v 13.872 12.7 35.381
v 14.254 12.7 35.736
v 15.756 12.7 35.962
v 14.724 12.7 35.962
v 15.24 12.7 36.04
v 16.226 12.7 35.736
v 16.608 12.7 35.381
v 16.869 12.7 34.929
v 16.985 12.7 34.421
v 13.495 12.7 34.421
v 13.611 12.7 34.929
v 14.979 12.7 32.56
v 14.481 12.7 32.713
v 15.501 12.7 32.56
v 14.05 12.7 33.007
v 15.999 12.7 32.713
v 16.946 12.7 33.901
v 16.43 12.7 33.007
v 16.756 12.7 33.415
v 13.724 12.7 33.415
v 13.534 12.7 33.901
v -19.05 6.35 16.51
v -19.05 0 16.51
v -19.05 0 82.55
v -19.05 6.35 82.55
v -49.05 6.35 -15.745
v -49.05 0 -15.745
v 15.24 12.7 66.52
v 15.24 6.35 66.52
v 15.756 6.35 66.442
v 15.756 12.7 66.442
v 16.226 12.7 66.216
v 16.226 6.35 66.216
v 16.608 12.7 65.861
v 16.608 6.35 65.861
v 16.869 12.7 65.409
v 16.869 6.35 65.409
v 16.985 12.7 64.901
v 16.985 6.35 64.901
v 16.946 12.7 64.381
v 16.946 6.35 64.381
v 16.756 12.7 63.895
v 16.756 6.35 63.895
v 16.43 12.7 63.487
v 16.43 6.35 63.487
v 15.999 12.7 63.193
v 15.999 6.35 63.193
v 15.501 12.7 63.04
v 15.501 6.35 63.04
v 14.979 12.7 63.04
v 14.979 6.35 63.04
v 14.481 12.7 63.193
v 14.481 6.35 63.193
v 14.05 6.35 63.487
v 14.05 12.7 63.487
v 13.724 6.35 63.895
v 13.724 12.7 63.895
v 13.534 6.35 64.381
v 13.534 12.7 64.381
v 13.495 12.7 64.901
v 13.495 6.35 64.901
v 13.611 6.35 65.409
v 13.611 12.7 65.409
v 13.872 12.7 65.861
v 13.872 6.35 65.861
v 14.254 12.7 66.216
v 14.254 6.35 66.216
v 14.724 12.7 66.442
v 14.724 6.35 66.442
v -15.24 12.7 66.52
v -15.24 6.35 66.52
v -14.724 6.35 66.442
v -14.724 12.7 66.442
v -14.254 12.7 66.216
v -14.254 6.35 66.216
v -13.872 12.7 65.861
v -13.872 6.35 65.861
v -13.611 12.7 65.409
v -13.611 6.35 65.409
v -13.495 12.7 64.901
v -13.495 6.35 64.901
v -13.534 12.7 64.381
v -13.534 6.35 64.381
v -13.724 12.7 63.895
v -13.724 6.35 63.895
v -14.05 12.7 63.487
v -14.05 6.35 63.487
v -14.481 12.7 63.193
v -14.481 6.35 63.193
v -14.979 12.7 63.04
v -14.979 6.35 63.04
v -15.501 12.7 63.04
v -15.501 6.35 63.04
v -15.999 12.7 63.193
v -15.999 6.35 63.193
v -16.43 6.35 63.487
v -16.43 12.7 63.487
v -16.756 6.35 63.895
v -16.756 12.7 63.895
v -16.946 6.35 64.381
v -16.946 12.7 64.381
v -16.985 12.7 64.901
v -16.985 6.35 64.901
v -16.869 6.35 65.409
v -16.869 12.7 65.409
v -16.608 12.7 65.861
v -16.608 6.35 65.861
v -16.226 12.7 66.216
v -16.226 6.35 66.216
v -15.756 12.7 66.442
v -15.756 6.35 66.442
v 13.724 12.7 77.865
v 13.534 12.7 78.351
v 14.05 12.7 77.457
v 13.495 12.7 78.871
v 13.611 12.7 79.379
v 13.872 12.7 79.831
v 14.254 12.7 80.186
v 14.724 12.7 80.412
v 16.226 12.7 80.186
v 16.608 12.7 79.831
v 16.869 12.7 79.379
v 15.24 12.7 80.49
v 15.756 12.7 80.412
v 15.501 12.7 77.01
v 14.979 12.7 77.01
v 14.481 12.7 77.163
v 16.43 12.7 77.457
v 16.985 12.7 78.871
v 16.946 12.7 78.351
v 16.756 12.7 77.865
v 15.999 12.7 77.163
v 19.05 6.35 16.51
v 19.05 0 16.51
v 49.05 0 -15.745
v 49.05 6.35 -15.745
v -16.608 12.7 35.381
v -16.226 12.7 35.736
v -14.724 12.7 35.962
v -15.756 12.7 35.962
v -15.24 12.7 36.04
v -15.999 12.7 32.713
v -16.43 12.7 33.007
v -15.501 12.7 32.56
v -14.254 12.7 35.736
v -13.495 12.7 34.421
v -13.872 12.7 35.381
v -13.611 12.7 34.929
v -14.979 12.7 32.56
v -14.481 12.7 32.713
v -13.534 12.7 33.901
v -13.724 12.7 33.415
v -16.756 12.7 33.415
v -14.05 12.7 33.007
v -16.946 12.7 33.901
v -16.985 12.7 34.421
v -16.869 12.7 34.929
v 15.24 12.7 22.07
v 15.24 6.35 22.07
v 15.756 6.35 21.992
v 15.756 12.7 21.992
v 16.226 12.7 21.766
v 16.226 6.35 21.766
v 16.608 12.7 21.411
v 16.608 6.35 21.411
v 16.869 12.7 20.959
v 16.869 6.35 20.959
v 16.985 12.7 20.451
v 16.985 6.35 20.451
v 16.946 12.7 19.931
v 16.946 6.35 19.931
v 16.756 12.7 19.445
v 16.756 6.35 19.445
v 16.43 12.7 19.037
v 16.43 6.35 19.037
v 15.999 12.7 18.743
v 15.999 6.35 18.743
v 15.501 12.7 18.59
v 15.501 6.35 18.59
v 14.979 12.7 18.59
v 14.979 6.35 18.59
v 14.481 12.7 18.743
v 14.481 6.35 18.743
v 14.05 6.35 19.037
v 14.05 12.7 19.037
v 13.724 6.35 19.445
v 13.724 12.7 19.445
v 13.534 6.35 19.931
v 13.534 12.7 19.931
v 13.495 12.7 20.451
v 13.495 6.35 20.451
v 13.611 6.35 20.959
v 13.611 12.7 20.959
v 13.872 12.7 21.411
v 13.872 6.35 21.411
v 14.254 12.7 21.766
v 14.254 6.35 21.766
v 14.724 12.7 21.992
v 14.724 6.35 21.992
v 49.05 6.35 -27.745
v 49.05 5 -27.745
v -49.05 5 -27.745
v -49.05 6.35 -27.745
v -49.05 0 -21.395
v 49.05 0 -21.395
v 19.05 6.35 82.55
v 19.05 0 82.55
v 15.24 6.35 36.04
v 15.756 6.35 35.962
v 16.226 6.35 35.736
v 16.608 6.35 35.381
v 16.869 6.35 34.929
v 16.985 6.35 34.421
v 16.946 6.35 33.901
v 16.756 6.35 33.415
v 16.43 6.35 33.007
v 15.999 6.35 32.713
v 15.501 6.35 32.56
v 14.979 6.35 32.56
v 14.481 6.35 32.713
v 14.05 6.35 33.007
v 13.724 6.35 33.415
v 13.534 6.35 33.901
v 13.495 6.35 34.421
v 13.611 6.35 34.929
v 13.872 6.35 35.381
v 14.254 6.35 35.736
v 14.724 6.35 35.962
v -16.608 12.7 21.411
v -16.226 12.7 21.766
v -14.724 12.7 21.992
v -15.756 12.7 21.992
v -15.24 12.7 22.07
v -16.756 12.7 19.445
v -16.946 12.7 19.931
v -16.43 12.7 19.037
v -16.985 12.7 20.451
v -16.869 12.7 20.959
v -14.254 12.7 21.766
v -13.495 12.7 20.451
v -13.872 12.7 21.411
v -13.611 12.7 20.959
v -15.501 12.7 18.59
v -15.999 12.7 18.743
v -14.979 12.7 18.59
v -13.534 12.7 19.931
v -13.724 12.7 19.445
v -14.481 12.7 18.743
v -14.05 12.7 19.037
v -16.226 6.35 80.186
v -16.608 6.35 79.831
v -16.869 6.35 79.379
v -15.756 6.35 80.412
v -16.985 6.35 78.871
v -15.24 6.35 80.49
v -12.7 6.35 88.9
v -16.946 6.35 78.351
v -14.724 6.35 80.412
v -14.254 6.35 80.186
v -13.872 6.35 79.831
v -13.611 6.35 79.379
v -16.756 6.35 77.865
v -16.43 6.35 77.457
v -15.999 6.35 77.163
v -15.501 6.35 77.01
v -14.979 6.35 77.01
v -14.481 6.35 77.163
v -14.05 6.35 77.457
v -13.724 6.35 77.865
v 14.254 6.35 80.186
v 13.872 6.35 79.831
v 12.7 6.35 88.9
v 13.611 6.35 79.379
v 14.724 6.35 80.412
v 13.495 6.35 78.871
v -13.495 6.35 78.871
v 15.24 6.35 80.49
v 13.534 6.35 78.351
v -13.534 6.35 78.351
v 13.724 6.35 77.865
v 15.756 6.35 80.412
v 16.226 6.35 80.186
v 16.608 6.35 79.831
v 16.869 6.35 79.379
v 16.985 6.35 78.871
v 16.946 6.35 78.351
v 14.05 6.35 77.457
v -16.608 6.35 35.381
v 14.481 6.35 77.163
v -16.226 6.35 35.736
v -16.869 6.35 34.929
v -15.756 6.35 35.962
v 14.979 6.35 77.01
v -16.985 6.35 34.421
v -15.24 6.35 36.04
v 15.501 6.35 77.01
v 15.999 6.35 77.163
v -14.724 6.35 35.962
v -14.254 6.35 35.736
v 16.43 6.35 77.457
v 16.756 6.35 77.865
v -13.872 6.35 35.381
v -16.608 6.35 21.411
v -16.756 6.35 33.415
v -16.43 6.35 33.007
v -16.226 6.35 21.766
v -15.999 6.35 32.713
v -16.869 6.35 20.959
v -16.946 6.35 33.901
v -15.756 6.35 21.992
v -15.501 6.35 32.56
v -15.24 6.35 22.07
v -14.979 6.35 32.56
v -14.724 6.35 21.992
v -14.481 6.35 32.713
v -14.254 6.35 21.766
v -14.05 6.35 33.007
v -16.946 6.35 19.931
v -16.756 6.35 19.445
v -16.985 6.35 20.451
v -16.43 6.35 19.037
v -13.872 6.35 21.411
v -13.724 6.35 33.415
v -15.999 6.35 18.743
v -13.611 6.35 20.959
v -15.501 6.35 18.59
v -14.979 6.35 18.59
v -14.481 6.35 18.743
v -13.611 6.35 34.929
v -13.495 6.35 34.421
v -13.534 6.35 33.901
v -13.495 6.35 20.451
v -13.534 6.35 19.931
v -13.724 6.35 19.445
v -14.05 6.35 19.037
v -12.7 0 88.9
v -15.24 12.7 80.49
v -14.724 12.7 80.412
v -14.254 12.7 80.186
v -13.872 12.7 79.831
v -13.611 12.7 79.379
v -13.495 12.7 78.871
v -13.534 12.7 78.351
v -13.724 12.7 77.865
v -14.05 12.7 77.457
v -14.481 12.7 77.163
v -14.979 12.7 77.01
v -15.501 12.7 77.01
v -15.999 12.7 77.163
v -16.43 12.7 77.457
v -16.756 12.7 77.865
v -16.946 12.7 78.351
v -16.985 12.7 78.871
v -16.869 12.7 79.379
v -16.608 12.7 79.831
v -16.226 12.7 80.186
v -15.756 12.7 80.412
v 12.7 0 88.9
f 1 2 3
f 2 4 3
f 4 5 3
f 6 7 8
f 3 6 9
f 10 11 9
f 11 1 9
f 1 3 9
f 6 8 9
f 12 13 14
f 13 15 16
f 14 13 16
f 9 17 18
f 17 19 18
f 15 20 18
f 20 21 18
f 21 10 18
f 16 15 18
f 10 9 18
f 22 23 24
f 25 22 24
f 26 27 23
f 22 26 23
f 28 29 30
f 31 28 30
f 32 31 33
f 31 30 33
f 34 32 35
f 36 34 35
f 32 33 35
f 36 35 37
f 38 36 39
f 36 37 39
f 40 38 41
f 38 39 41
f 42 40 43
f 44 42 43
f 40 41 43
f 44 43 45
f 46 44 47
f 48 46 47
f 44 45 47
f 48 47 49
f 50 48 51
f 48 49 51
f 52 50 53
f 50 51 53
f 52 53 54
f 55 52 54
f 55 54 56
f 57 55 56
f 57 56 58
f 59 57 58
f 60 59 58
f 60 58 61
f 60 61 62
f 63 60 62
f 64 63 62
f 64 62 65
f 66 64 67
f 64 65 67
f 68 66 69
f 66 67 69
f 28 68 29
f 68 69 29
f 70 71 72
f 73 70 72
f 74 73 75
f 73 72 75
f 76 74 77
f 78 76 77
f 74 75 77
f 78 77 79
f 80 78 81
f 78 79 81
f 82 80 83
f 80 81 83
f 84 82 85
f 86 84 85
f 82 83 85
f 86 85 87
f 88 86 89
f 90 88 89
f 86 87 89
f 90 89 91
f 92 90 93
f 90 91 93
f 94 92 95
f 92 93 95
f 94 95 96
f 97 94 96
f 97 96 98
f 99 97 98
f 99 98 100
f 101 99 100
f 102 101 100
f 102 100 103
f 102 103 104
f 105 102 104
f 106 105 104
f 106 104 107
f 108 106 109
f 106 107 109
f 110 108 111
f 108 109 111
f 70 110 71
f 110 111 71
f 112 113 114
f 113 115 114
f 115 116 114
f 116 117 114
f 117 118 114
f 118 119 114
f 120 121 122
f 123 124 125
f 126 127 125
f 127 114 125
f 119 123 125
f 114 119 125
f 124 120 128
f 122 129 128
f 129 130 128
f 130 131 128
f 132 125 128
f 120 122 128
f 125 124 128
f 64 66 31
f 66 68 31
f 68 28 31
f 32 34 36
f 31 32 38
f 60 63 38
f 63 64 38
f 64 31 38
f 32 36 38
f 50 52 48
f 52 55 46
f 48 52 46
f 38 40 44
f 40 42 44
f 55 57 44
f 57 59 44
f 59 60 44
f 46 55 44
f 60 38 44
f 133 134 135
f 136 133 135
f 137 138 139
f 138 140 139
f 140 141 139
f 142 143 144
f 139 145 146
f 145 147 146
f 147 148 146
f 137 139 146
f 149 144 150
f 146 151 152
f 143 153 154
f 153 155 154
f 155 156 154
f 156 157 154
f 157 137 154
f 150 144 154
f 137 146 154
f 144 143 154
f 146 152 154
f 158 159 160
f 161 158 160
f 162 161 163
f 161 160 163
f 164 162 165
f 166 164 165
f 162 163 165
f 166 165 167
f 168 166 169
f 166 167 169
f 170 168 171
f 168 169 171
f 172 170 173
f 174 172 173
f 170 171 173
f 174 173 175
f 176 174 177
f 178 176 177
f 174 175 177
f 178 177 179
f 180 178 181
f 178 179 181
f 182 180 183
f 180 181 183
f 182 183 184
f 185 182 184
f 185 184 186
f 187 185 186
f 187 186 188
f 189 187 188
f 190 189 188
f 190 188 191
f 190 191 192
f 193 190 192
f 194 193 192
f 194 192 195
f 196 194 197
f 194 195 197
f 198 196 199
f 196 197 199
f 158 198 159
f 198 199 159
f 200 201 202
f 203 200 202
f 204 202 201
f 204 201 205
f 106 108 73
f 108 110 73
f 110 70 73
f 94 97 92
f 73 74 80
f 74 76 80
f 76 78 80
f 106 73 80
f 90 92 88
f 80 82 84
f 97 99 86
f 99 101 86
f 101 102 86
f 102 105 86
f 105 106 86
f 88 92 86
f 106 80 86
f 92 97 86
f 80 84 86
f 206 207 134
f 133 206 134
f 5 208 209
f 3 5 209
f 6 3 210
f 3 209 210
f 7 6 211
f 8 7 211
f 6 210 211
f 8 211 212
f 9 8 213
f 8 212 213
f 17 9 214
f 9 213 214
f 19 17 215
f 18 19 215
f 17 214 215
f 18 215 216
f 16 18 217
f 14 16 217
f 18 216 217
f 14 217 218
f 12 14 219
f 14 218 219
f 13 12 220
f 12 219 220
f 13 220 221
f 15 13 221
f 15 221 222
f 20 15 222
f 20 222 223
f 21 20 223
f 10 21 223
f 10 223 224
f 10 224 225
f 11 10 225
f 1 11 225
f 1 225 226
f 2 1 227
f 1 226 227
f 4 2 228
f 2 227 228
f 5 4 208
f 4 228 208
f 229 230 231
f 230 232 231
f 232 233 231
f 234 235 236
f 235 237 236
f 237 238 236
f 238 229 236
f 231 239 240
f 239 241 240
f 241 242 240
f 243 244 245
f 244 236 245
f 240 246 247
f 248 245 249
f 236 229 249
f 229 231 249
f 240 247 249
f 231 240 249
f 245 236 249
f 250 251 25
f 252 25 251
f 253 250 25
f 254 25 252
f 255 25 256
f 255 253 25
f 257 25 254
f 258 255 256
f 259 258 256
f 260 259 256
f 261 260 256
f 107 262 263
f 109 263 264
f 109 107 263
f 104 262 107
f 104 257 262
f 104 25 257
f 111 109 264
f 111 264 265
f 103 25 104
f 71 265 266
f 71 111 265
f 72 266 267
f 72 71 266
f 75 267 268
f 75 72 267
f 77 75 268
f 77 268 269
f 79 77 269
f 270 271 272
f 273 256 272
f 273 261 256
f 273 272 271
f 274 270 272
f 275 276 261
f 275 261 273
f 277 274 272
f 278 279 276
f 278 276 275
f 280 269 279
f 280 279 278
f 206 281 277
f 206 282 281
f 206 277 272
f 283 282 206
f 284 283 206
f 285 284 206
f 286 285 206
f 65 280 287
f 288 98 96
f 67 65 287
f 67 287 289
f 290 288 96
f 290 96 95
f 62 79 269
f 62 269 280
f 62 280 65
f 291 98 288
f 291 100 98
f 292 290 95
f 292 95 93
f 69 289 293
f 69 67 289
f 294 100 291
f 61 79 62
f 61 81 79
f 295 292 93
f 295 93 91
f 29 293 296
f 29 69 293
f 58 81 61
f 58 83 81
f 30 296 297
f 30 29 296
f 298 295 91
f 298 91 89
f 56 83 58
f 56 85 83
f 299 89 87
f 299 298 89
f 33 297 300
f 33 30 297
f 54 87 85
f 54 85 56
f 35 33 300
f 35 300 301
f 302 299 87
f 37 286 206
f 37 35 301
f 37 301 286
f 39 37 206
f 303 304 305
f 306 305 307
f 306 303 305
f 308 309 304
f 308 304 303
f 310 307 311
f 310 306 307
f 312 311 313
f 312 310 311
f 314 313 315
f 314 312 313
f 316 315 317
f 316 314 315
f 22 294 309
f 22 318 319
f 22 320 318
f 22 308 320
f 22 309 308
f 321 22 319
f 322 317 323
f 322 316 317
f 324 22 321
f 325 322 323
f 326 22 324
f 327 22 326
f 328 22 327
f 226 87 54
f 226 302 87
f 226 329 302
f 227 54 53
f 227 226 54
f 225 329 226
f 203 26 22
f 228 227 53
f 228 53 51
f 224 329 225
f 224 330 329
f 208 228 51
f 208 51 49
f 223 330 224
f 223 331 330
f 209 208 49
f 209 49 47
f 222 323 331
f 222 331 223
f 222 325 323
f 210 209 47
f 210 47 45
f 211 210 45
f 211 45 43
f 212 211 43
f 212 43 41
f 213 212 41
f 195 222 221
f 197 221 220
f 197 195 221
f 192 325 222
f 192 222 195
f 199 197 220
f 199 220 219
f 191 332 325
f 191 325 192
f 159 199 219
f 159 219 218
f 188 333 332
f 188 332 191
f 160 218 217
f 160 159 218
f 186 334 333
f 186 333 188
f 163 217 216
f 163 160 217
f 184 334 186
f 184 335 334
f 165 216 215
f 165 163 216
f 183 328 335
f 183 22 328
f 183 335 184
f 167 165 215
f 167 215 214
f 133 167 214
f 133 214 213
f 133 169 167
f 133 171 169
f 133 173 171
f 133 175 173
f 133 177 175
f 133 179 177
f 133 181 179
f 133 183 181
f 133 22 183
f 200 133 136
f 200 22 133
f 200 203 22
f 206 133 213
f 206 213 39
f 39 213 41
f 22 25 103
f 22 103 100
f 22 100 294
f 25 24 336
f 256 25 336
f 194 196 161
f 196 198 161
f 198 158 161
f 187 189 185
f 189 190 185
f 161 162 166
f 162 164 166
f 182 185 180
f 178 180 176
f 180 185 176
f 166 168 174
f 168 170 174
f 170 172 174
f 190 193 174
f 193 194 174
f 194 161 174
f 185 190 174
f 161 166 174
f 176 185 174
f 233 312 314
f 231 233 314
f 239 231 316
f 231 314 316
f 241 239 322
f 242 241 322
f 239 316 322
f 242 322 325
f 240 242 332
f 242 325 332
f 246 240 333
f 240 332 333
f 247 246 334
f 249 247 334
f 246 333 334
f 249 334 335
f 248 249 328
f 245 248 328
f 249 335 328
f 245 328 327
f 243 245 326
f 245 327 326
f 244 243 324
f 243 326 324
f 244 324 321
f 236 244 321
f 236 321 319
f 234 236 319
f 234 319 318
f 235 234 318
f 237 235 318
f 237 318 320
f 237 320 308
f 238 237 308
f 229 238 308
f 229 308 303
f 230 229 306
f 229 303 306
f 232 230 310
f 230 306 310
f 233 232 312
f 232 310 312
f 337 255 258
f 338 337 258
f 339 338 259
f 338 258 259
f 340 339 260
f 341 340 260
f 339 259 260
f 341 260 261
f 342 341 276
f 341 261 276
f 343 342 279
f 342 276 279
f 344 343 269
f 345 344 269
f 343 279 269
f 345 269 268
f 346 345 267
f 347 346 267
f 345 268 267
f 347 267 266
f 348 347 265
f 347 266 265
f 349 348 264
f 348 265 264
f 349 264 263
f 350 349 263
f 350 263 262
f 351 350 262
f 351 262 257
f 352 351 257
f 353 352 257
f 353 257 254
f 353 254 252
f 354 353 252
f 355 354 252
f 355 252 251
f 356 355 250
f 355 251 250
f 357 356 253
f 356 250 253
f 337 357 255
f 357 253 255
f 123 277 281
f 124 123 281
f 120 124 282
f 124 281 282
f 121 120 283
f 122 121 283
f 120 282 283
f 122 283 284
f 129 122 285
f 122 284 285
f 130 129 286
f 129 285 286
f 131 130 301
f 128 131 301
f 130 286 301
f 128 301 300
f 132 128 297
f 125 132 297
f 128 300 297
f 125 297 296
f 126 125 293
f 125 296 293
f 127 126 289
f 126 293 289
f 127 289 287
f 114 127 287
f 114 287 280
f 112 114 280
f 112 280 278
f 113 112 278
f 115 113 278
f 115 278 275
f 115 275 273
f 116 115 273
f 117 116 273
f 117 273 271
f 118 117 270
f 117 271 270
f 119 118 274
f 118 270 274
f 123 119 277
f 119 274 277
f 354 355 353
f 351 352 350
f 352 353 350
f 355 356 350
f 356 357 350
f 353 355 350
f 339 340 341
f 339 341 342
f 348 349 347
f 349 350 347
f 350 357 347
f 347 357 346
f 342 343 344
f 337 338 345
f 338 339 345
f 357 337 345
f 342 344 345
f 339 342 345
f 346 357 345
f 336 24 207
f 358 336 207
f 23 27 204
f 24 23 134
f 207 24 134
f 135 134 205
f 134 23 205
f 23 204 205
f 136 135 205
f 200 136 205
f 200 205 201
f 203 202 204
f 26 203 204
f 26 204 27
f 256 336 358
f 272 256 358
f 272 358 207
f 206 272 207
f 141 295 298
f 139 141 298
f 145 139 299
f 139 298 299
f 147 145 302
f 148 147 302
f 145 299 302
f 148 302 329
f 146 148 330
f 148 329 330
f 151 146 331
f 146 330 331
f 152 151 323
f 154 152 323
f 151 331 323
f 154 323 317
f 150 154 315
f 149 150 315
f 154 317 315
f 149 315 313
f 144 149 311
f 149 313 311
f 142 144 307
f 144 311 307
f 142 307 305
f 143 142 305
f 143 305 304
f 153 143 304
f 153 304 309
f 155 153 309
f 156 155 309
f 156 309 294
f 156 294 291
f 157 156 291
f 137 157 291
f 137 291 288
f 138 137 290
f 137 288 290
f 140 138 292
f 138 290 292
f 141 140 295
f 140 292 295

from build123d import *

# Parameters (mm, degrees)
SKETCH3_R           = 1.905
BOSS_EXTRUDE1_DEPTH = 6.35
CUT_EXTRUDE1_DEPTH  = 133.5410974
SKETCH5_R           = 1.905
BOSS_EXTRUDE2_DEPTH = 12.700000124
CUT_EXTRUDE2_START  = -6.350000124
SKETCH6_R           = 1.905
SKETCH6_R_2         = 1.75
CUT_EXTRUDE2_DEPTH  = 6.350000124


with BuildPart() as part:
    # Sketch3 → Boss-Extrude1 (new body)
    with BuildSketch(Plane(origin=(0, 0, 0), x_dir=(1, 0, 0), z_dir=(0, 1, 0))):
        Polygon((-19.05, -82.55), (-12.7, -88.9), (12.7, -88.9), (19.05, -82.55), (19.05, -74.93), (19.05, -68.58), (19.05, -60.96), (19.05, -38.1), (19.05, -30.48), (19.05, -24.13), (19.05, -16.51), (49.05, 15.745), (49.05, 27.745), (-49.05, 27.745), (-49.05, 15.745), (-19.05, -16.51), (-19.05, -24.13), (-19.05, -30.48), (-19.05, -38.1), (-19.05, -60.96), (-19.05, -68.58), (-19.05, -74.93), align=None)
        with Locations(Location((-15.24, -78.74, 0), (0, 0, 270))):
            Circle(SKETCH3_R, mode=Mode.SUBTRACT)
        with Locations(Location((15.24, -78.74, 0), (0, 0, 270))):
            Circle(SKETCH3_R, mode=Mode.SUBTRACT)
        with Locations(Location((15.24, -64.77, 0), (0, 0, 270))):
            Circle(SKETCH3_R, mode=Mode.SUBTRACT)
        with Locations(Location((-15.24, -64.77, 0), (0, 0, 270))):
            Circle(SKETCH3_R, mode=Mode.SUBTRACT)
        with Locations(Location((-15.24, -20.32, 0), (0, 0, 270))):
            Circle(SKETCH3_R, mode=Mode.SUBTRACT)
        with Locations(Location((15.24, -20.32, 0), (0, 0, 270))):
            Circle(SKETCH3_R, mode=Mode.SUBTRACT)
        with Locations(Location((15.24, -34.29, 0), (0, 0, 270))):
            Circle(SKETCH3_R, mode=Mode.SUBTRACT)
        with Locations(Location((-15.24, -34.29, 0), (0, 0, 270))):
            Circle(SKETCH3_R, mode=Mode.SUBTRACT)
    extrude(amount=BOSS_EXTRUDE1_DEPTH)

    # Sketch4 → Cut-Extrude1 (cut, through all)
    with BuildSketch(Plane.ZY.offset(49.05)):
        Polygon((-21.395, 0), (-27.745, 0), (-27.745, 5), align=None)
    extrude(amount=-CUT_EXTRUDE1_DEPTH, mode=Mode.SUBTRACT)

    # Sketch5 → Boss-Extrude2 (add)
    with BuildSketch(Plane.XZ):
        with Locations(Location((-15.24, 20.32, 0), (0, 0, 270))):
            Circle(SKETCH5_R)
        with Locations(Location((-15.24, 34.29, 0), (0, 0, 270))):
            Circle(SKETCH5_R)
        with Locations(Location((15.24, 20.32, 0), (0, 0, 270))):
            Circle(SKETCH5_R)
        with Locations(Location((15.24, 34.29, 0), (0, 0, 270))):
            Circle(SKETCH5_R)
        with Locations(Location((15.24, 64.77, 0), (0, 0, 270))):
            Circle(SKETCH5_R)
        with Locations(Location((15.24, 78.74, 0), (0, 0, 270))):
            Circle(SKETCH5_R)
        with Locations(Location((-15.24, 64.77, 0), (0, 0, 270))):
            Circle(SKETCH5_R)
        with Locations(Location((-15.24, 78.74, 0), (0, 0, 270))):
            Circle(SKETCH5_R)
    extrude(amount=-BOSS_EXTRUDE2_DEPTH)

    # Sketch6 → Cut-Extrude2 (cut)
    # profile 1 of 8: a face of its own
    with BuildSketch(Plane(origin=(0, 12.700000124, 0), x_dir=(1, 0, 0), z_dir=(0, 1, 0)).offset(CUT_EXTRUDE2_START)):
        with Locations((-15.24, -78.74)):
            Circle(SKETCH6_R)
        with Locations(Location((-15.24, -78.74, 0), (0, 0, 270))):
            Circle(SKETCH6_R_2, mode=Mode.SUBTRACT)
    # profile 2 of 8: a face of its own
    with BuildSketch(Plane(origin=(0, 12.700000124, 0), x_dir=(1, 0, 0), z_dir=(0, 1, 0)).offset(CUT_EXTRUDE2_START)):
        with Locations((15.24, -78.74)):
            Circle(SKETCH6_R)
        with Locations(Location((15.24, -78.74, 0), (0, 0, 270))):
            Circle(SKETCH6_R_2, mode=Mode.SUBTRACT)
    # profile 3 of 8: a face of its own
    with BuildSketch(Plane(origin=(0, 12.700000124, 0), x_dir=(1, 0, 0), z_dir=(0, 1, 0)).offset(CUT_EXTRUDE2_START)):
        with Locations((15.24, -64.77)):
            Circle(SKETCH6_R)
        with Locations(Location((15.24, -64.77, 0), (0, 0, 270))):
            Circle(SKETCH6_R_2, mode=Mode.SUBTRACT)
    # profile 4 of 8: a face of its own
    with BuildSketch(Plane(origin=(0, 12.700000124, 0), x_dir=(1, 0, 0), z_dir=(0, 1, 0)).offset(CUT_EXTRUDE2_START)):
        with Locations((-15.24, -64.77)):
            Circle(SKETCH6_R)
        with Locations(Location((-15.24, -64.77, 0), (0, 0, 270))):
            Circle(SKETCH6_R_2, mode=Mode.SUBTRACT)
    # profile 5 of 8: a face of its own
    with BuildSketch(Plane(origin=(0, 12.700000124, 0), x_dir=(1, 0, 0), z_dir=(0, 1, 0)).offset(CUT_EXTRUDE2_START)):
        with Locations((-15.24, -34.29)):
            Circle(SKETCH6_R)
        with Locations(Location((-15.24, -34.29, 0), (0, 0, 270))):
            Circle(SKETCH6_R_2, mode=Mode.SUBTRACT)
    # profile 6 of 8: a face of its own
    with BuildSketch(Plane(origin=(0, 12.700000124, 0), x_dir=(1, 0, 0), z_dir=(0, 1, 0)).offset(CUT_EXTRUDE2_START)):
        with Locations((15.24, -34.29)):
            Circle(SKETCH6_R)
        with Locations(Location((15.24, -34.29, 0), (0, 0, 270))):
            Circle(SKETCH6_R_2, mode=Mode.SUBTRACT)
    # profile 7 of 8: a face of its own
    with BuildSketch(Plane(origin=(0, 12.700000124, 0), x_dir=(1, 0, 0), z_dir=(0, 1, 0)).offset(CUT_EXTRUDE2_START)):
        with Locations((15.24, -20.32)):
            Circle(SKETCH6_R)
        with Locations(Location((15.24, -20.32, 0), (0, 0, 270))):
            Circle(SKETCH6_R_2, mode=Mode.SUBTRACT)
    # profile 8 of 8: a face of its own
    with BuildSketch(Plane(origin=(0, 12.700000124, 0), x_dir=(1, 0, 0), z_dir=(0, 1, 0)).offset(CUT_EXTRUDE2_START)):
        with Locations((-15.24, -20.32)):
            Circle(SKETCH6_R)
        with Locations(Location((-15.24, -20.32, 0), (0, 0, 270))):
            Circle(SKETCH6_R_2, mode=Mode.SUBTRACT)
    extrude(amount=CUT_EXTRUDE2_DEPTH, mode=Mode.SUBTRACT)


solid = part.part
